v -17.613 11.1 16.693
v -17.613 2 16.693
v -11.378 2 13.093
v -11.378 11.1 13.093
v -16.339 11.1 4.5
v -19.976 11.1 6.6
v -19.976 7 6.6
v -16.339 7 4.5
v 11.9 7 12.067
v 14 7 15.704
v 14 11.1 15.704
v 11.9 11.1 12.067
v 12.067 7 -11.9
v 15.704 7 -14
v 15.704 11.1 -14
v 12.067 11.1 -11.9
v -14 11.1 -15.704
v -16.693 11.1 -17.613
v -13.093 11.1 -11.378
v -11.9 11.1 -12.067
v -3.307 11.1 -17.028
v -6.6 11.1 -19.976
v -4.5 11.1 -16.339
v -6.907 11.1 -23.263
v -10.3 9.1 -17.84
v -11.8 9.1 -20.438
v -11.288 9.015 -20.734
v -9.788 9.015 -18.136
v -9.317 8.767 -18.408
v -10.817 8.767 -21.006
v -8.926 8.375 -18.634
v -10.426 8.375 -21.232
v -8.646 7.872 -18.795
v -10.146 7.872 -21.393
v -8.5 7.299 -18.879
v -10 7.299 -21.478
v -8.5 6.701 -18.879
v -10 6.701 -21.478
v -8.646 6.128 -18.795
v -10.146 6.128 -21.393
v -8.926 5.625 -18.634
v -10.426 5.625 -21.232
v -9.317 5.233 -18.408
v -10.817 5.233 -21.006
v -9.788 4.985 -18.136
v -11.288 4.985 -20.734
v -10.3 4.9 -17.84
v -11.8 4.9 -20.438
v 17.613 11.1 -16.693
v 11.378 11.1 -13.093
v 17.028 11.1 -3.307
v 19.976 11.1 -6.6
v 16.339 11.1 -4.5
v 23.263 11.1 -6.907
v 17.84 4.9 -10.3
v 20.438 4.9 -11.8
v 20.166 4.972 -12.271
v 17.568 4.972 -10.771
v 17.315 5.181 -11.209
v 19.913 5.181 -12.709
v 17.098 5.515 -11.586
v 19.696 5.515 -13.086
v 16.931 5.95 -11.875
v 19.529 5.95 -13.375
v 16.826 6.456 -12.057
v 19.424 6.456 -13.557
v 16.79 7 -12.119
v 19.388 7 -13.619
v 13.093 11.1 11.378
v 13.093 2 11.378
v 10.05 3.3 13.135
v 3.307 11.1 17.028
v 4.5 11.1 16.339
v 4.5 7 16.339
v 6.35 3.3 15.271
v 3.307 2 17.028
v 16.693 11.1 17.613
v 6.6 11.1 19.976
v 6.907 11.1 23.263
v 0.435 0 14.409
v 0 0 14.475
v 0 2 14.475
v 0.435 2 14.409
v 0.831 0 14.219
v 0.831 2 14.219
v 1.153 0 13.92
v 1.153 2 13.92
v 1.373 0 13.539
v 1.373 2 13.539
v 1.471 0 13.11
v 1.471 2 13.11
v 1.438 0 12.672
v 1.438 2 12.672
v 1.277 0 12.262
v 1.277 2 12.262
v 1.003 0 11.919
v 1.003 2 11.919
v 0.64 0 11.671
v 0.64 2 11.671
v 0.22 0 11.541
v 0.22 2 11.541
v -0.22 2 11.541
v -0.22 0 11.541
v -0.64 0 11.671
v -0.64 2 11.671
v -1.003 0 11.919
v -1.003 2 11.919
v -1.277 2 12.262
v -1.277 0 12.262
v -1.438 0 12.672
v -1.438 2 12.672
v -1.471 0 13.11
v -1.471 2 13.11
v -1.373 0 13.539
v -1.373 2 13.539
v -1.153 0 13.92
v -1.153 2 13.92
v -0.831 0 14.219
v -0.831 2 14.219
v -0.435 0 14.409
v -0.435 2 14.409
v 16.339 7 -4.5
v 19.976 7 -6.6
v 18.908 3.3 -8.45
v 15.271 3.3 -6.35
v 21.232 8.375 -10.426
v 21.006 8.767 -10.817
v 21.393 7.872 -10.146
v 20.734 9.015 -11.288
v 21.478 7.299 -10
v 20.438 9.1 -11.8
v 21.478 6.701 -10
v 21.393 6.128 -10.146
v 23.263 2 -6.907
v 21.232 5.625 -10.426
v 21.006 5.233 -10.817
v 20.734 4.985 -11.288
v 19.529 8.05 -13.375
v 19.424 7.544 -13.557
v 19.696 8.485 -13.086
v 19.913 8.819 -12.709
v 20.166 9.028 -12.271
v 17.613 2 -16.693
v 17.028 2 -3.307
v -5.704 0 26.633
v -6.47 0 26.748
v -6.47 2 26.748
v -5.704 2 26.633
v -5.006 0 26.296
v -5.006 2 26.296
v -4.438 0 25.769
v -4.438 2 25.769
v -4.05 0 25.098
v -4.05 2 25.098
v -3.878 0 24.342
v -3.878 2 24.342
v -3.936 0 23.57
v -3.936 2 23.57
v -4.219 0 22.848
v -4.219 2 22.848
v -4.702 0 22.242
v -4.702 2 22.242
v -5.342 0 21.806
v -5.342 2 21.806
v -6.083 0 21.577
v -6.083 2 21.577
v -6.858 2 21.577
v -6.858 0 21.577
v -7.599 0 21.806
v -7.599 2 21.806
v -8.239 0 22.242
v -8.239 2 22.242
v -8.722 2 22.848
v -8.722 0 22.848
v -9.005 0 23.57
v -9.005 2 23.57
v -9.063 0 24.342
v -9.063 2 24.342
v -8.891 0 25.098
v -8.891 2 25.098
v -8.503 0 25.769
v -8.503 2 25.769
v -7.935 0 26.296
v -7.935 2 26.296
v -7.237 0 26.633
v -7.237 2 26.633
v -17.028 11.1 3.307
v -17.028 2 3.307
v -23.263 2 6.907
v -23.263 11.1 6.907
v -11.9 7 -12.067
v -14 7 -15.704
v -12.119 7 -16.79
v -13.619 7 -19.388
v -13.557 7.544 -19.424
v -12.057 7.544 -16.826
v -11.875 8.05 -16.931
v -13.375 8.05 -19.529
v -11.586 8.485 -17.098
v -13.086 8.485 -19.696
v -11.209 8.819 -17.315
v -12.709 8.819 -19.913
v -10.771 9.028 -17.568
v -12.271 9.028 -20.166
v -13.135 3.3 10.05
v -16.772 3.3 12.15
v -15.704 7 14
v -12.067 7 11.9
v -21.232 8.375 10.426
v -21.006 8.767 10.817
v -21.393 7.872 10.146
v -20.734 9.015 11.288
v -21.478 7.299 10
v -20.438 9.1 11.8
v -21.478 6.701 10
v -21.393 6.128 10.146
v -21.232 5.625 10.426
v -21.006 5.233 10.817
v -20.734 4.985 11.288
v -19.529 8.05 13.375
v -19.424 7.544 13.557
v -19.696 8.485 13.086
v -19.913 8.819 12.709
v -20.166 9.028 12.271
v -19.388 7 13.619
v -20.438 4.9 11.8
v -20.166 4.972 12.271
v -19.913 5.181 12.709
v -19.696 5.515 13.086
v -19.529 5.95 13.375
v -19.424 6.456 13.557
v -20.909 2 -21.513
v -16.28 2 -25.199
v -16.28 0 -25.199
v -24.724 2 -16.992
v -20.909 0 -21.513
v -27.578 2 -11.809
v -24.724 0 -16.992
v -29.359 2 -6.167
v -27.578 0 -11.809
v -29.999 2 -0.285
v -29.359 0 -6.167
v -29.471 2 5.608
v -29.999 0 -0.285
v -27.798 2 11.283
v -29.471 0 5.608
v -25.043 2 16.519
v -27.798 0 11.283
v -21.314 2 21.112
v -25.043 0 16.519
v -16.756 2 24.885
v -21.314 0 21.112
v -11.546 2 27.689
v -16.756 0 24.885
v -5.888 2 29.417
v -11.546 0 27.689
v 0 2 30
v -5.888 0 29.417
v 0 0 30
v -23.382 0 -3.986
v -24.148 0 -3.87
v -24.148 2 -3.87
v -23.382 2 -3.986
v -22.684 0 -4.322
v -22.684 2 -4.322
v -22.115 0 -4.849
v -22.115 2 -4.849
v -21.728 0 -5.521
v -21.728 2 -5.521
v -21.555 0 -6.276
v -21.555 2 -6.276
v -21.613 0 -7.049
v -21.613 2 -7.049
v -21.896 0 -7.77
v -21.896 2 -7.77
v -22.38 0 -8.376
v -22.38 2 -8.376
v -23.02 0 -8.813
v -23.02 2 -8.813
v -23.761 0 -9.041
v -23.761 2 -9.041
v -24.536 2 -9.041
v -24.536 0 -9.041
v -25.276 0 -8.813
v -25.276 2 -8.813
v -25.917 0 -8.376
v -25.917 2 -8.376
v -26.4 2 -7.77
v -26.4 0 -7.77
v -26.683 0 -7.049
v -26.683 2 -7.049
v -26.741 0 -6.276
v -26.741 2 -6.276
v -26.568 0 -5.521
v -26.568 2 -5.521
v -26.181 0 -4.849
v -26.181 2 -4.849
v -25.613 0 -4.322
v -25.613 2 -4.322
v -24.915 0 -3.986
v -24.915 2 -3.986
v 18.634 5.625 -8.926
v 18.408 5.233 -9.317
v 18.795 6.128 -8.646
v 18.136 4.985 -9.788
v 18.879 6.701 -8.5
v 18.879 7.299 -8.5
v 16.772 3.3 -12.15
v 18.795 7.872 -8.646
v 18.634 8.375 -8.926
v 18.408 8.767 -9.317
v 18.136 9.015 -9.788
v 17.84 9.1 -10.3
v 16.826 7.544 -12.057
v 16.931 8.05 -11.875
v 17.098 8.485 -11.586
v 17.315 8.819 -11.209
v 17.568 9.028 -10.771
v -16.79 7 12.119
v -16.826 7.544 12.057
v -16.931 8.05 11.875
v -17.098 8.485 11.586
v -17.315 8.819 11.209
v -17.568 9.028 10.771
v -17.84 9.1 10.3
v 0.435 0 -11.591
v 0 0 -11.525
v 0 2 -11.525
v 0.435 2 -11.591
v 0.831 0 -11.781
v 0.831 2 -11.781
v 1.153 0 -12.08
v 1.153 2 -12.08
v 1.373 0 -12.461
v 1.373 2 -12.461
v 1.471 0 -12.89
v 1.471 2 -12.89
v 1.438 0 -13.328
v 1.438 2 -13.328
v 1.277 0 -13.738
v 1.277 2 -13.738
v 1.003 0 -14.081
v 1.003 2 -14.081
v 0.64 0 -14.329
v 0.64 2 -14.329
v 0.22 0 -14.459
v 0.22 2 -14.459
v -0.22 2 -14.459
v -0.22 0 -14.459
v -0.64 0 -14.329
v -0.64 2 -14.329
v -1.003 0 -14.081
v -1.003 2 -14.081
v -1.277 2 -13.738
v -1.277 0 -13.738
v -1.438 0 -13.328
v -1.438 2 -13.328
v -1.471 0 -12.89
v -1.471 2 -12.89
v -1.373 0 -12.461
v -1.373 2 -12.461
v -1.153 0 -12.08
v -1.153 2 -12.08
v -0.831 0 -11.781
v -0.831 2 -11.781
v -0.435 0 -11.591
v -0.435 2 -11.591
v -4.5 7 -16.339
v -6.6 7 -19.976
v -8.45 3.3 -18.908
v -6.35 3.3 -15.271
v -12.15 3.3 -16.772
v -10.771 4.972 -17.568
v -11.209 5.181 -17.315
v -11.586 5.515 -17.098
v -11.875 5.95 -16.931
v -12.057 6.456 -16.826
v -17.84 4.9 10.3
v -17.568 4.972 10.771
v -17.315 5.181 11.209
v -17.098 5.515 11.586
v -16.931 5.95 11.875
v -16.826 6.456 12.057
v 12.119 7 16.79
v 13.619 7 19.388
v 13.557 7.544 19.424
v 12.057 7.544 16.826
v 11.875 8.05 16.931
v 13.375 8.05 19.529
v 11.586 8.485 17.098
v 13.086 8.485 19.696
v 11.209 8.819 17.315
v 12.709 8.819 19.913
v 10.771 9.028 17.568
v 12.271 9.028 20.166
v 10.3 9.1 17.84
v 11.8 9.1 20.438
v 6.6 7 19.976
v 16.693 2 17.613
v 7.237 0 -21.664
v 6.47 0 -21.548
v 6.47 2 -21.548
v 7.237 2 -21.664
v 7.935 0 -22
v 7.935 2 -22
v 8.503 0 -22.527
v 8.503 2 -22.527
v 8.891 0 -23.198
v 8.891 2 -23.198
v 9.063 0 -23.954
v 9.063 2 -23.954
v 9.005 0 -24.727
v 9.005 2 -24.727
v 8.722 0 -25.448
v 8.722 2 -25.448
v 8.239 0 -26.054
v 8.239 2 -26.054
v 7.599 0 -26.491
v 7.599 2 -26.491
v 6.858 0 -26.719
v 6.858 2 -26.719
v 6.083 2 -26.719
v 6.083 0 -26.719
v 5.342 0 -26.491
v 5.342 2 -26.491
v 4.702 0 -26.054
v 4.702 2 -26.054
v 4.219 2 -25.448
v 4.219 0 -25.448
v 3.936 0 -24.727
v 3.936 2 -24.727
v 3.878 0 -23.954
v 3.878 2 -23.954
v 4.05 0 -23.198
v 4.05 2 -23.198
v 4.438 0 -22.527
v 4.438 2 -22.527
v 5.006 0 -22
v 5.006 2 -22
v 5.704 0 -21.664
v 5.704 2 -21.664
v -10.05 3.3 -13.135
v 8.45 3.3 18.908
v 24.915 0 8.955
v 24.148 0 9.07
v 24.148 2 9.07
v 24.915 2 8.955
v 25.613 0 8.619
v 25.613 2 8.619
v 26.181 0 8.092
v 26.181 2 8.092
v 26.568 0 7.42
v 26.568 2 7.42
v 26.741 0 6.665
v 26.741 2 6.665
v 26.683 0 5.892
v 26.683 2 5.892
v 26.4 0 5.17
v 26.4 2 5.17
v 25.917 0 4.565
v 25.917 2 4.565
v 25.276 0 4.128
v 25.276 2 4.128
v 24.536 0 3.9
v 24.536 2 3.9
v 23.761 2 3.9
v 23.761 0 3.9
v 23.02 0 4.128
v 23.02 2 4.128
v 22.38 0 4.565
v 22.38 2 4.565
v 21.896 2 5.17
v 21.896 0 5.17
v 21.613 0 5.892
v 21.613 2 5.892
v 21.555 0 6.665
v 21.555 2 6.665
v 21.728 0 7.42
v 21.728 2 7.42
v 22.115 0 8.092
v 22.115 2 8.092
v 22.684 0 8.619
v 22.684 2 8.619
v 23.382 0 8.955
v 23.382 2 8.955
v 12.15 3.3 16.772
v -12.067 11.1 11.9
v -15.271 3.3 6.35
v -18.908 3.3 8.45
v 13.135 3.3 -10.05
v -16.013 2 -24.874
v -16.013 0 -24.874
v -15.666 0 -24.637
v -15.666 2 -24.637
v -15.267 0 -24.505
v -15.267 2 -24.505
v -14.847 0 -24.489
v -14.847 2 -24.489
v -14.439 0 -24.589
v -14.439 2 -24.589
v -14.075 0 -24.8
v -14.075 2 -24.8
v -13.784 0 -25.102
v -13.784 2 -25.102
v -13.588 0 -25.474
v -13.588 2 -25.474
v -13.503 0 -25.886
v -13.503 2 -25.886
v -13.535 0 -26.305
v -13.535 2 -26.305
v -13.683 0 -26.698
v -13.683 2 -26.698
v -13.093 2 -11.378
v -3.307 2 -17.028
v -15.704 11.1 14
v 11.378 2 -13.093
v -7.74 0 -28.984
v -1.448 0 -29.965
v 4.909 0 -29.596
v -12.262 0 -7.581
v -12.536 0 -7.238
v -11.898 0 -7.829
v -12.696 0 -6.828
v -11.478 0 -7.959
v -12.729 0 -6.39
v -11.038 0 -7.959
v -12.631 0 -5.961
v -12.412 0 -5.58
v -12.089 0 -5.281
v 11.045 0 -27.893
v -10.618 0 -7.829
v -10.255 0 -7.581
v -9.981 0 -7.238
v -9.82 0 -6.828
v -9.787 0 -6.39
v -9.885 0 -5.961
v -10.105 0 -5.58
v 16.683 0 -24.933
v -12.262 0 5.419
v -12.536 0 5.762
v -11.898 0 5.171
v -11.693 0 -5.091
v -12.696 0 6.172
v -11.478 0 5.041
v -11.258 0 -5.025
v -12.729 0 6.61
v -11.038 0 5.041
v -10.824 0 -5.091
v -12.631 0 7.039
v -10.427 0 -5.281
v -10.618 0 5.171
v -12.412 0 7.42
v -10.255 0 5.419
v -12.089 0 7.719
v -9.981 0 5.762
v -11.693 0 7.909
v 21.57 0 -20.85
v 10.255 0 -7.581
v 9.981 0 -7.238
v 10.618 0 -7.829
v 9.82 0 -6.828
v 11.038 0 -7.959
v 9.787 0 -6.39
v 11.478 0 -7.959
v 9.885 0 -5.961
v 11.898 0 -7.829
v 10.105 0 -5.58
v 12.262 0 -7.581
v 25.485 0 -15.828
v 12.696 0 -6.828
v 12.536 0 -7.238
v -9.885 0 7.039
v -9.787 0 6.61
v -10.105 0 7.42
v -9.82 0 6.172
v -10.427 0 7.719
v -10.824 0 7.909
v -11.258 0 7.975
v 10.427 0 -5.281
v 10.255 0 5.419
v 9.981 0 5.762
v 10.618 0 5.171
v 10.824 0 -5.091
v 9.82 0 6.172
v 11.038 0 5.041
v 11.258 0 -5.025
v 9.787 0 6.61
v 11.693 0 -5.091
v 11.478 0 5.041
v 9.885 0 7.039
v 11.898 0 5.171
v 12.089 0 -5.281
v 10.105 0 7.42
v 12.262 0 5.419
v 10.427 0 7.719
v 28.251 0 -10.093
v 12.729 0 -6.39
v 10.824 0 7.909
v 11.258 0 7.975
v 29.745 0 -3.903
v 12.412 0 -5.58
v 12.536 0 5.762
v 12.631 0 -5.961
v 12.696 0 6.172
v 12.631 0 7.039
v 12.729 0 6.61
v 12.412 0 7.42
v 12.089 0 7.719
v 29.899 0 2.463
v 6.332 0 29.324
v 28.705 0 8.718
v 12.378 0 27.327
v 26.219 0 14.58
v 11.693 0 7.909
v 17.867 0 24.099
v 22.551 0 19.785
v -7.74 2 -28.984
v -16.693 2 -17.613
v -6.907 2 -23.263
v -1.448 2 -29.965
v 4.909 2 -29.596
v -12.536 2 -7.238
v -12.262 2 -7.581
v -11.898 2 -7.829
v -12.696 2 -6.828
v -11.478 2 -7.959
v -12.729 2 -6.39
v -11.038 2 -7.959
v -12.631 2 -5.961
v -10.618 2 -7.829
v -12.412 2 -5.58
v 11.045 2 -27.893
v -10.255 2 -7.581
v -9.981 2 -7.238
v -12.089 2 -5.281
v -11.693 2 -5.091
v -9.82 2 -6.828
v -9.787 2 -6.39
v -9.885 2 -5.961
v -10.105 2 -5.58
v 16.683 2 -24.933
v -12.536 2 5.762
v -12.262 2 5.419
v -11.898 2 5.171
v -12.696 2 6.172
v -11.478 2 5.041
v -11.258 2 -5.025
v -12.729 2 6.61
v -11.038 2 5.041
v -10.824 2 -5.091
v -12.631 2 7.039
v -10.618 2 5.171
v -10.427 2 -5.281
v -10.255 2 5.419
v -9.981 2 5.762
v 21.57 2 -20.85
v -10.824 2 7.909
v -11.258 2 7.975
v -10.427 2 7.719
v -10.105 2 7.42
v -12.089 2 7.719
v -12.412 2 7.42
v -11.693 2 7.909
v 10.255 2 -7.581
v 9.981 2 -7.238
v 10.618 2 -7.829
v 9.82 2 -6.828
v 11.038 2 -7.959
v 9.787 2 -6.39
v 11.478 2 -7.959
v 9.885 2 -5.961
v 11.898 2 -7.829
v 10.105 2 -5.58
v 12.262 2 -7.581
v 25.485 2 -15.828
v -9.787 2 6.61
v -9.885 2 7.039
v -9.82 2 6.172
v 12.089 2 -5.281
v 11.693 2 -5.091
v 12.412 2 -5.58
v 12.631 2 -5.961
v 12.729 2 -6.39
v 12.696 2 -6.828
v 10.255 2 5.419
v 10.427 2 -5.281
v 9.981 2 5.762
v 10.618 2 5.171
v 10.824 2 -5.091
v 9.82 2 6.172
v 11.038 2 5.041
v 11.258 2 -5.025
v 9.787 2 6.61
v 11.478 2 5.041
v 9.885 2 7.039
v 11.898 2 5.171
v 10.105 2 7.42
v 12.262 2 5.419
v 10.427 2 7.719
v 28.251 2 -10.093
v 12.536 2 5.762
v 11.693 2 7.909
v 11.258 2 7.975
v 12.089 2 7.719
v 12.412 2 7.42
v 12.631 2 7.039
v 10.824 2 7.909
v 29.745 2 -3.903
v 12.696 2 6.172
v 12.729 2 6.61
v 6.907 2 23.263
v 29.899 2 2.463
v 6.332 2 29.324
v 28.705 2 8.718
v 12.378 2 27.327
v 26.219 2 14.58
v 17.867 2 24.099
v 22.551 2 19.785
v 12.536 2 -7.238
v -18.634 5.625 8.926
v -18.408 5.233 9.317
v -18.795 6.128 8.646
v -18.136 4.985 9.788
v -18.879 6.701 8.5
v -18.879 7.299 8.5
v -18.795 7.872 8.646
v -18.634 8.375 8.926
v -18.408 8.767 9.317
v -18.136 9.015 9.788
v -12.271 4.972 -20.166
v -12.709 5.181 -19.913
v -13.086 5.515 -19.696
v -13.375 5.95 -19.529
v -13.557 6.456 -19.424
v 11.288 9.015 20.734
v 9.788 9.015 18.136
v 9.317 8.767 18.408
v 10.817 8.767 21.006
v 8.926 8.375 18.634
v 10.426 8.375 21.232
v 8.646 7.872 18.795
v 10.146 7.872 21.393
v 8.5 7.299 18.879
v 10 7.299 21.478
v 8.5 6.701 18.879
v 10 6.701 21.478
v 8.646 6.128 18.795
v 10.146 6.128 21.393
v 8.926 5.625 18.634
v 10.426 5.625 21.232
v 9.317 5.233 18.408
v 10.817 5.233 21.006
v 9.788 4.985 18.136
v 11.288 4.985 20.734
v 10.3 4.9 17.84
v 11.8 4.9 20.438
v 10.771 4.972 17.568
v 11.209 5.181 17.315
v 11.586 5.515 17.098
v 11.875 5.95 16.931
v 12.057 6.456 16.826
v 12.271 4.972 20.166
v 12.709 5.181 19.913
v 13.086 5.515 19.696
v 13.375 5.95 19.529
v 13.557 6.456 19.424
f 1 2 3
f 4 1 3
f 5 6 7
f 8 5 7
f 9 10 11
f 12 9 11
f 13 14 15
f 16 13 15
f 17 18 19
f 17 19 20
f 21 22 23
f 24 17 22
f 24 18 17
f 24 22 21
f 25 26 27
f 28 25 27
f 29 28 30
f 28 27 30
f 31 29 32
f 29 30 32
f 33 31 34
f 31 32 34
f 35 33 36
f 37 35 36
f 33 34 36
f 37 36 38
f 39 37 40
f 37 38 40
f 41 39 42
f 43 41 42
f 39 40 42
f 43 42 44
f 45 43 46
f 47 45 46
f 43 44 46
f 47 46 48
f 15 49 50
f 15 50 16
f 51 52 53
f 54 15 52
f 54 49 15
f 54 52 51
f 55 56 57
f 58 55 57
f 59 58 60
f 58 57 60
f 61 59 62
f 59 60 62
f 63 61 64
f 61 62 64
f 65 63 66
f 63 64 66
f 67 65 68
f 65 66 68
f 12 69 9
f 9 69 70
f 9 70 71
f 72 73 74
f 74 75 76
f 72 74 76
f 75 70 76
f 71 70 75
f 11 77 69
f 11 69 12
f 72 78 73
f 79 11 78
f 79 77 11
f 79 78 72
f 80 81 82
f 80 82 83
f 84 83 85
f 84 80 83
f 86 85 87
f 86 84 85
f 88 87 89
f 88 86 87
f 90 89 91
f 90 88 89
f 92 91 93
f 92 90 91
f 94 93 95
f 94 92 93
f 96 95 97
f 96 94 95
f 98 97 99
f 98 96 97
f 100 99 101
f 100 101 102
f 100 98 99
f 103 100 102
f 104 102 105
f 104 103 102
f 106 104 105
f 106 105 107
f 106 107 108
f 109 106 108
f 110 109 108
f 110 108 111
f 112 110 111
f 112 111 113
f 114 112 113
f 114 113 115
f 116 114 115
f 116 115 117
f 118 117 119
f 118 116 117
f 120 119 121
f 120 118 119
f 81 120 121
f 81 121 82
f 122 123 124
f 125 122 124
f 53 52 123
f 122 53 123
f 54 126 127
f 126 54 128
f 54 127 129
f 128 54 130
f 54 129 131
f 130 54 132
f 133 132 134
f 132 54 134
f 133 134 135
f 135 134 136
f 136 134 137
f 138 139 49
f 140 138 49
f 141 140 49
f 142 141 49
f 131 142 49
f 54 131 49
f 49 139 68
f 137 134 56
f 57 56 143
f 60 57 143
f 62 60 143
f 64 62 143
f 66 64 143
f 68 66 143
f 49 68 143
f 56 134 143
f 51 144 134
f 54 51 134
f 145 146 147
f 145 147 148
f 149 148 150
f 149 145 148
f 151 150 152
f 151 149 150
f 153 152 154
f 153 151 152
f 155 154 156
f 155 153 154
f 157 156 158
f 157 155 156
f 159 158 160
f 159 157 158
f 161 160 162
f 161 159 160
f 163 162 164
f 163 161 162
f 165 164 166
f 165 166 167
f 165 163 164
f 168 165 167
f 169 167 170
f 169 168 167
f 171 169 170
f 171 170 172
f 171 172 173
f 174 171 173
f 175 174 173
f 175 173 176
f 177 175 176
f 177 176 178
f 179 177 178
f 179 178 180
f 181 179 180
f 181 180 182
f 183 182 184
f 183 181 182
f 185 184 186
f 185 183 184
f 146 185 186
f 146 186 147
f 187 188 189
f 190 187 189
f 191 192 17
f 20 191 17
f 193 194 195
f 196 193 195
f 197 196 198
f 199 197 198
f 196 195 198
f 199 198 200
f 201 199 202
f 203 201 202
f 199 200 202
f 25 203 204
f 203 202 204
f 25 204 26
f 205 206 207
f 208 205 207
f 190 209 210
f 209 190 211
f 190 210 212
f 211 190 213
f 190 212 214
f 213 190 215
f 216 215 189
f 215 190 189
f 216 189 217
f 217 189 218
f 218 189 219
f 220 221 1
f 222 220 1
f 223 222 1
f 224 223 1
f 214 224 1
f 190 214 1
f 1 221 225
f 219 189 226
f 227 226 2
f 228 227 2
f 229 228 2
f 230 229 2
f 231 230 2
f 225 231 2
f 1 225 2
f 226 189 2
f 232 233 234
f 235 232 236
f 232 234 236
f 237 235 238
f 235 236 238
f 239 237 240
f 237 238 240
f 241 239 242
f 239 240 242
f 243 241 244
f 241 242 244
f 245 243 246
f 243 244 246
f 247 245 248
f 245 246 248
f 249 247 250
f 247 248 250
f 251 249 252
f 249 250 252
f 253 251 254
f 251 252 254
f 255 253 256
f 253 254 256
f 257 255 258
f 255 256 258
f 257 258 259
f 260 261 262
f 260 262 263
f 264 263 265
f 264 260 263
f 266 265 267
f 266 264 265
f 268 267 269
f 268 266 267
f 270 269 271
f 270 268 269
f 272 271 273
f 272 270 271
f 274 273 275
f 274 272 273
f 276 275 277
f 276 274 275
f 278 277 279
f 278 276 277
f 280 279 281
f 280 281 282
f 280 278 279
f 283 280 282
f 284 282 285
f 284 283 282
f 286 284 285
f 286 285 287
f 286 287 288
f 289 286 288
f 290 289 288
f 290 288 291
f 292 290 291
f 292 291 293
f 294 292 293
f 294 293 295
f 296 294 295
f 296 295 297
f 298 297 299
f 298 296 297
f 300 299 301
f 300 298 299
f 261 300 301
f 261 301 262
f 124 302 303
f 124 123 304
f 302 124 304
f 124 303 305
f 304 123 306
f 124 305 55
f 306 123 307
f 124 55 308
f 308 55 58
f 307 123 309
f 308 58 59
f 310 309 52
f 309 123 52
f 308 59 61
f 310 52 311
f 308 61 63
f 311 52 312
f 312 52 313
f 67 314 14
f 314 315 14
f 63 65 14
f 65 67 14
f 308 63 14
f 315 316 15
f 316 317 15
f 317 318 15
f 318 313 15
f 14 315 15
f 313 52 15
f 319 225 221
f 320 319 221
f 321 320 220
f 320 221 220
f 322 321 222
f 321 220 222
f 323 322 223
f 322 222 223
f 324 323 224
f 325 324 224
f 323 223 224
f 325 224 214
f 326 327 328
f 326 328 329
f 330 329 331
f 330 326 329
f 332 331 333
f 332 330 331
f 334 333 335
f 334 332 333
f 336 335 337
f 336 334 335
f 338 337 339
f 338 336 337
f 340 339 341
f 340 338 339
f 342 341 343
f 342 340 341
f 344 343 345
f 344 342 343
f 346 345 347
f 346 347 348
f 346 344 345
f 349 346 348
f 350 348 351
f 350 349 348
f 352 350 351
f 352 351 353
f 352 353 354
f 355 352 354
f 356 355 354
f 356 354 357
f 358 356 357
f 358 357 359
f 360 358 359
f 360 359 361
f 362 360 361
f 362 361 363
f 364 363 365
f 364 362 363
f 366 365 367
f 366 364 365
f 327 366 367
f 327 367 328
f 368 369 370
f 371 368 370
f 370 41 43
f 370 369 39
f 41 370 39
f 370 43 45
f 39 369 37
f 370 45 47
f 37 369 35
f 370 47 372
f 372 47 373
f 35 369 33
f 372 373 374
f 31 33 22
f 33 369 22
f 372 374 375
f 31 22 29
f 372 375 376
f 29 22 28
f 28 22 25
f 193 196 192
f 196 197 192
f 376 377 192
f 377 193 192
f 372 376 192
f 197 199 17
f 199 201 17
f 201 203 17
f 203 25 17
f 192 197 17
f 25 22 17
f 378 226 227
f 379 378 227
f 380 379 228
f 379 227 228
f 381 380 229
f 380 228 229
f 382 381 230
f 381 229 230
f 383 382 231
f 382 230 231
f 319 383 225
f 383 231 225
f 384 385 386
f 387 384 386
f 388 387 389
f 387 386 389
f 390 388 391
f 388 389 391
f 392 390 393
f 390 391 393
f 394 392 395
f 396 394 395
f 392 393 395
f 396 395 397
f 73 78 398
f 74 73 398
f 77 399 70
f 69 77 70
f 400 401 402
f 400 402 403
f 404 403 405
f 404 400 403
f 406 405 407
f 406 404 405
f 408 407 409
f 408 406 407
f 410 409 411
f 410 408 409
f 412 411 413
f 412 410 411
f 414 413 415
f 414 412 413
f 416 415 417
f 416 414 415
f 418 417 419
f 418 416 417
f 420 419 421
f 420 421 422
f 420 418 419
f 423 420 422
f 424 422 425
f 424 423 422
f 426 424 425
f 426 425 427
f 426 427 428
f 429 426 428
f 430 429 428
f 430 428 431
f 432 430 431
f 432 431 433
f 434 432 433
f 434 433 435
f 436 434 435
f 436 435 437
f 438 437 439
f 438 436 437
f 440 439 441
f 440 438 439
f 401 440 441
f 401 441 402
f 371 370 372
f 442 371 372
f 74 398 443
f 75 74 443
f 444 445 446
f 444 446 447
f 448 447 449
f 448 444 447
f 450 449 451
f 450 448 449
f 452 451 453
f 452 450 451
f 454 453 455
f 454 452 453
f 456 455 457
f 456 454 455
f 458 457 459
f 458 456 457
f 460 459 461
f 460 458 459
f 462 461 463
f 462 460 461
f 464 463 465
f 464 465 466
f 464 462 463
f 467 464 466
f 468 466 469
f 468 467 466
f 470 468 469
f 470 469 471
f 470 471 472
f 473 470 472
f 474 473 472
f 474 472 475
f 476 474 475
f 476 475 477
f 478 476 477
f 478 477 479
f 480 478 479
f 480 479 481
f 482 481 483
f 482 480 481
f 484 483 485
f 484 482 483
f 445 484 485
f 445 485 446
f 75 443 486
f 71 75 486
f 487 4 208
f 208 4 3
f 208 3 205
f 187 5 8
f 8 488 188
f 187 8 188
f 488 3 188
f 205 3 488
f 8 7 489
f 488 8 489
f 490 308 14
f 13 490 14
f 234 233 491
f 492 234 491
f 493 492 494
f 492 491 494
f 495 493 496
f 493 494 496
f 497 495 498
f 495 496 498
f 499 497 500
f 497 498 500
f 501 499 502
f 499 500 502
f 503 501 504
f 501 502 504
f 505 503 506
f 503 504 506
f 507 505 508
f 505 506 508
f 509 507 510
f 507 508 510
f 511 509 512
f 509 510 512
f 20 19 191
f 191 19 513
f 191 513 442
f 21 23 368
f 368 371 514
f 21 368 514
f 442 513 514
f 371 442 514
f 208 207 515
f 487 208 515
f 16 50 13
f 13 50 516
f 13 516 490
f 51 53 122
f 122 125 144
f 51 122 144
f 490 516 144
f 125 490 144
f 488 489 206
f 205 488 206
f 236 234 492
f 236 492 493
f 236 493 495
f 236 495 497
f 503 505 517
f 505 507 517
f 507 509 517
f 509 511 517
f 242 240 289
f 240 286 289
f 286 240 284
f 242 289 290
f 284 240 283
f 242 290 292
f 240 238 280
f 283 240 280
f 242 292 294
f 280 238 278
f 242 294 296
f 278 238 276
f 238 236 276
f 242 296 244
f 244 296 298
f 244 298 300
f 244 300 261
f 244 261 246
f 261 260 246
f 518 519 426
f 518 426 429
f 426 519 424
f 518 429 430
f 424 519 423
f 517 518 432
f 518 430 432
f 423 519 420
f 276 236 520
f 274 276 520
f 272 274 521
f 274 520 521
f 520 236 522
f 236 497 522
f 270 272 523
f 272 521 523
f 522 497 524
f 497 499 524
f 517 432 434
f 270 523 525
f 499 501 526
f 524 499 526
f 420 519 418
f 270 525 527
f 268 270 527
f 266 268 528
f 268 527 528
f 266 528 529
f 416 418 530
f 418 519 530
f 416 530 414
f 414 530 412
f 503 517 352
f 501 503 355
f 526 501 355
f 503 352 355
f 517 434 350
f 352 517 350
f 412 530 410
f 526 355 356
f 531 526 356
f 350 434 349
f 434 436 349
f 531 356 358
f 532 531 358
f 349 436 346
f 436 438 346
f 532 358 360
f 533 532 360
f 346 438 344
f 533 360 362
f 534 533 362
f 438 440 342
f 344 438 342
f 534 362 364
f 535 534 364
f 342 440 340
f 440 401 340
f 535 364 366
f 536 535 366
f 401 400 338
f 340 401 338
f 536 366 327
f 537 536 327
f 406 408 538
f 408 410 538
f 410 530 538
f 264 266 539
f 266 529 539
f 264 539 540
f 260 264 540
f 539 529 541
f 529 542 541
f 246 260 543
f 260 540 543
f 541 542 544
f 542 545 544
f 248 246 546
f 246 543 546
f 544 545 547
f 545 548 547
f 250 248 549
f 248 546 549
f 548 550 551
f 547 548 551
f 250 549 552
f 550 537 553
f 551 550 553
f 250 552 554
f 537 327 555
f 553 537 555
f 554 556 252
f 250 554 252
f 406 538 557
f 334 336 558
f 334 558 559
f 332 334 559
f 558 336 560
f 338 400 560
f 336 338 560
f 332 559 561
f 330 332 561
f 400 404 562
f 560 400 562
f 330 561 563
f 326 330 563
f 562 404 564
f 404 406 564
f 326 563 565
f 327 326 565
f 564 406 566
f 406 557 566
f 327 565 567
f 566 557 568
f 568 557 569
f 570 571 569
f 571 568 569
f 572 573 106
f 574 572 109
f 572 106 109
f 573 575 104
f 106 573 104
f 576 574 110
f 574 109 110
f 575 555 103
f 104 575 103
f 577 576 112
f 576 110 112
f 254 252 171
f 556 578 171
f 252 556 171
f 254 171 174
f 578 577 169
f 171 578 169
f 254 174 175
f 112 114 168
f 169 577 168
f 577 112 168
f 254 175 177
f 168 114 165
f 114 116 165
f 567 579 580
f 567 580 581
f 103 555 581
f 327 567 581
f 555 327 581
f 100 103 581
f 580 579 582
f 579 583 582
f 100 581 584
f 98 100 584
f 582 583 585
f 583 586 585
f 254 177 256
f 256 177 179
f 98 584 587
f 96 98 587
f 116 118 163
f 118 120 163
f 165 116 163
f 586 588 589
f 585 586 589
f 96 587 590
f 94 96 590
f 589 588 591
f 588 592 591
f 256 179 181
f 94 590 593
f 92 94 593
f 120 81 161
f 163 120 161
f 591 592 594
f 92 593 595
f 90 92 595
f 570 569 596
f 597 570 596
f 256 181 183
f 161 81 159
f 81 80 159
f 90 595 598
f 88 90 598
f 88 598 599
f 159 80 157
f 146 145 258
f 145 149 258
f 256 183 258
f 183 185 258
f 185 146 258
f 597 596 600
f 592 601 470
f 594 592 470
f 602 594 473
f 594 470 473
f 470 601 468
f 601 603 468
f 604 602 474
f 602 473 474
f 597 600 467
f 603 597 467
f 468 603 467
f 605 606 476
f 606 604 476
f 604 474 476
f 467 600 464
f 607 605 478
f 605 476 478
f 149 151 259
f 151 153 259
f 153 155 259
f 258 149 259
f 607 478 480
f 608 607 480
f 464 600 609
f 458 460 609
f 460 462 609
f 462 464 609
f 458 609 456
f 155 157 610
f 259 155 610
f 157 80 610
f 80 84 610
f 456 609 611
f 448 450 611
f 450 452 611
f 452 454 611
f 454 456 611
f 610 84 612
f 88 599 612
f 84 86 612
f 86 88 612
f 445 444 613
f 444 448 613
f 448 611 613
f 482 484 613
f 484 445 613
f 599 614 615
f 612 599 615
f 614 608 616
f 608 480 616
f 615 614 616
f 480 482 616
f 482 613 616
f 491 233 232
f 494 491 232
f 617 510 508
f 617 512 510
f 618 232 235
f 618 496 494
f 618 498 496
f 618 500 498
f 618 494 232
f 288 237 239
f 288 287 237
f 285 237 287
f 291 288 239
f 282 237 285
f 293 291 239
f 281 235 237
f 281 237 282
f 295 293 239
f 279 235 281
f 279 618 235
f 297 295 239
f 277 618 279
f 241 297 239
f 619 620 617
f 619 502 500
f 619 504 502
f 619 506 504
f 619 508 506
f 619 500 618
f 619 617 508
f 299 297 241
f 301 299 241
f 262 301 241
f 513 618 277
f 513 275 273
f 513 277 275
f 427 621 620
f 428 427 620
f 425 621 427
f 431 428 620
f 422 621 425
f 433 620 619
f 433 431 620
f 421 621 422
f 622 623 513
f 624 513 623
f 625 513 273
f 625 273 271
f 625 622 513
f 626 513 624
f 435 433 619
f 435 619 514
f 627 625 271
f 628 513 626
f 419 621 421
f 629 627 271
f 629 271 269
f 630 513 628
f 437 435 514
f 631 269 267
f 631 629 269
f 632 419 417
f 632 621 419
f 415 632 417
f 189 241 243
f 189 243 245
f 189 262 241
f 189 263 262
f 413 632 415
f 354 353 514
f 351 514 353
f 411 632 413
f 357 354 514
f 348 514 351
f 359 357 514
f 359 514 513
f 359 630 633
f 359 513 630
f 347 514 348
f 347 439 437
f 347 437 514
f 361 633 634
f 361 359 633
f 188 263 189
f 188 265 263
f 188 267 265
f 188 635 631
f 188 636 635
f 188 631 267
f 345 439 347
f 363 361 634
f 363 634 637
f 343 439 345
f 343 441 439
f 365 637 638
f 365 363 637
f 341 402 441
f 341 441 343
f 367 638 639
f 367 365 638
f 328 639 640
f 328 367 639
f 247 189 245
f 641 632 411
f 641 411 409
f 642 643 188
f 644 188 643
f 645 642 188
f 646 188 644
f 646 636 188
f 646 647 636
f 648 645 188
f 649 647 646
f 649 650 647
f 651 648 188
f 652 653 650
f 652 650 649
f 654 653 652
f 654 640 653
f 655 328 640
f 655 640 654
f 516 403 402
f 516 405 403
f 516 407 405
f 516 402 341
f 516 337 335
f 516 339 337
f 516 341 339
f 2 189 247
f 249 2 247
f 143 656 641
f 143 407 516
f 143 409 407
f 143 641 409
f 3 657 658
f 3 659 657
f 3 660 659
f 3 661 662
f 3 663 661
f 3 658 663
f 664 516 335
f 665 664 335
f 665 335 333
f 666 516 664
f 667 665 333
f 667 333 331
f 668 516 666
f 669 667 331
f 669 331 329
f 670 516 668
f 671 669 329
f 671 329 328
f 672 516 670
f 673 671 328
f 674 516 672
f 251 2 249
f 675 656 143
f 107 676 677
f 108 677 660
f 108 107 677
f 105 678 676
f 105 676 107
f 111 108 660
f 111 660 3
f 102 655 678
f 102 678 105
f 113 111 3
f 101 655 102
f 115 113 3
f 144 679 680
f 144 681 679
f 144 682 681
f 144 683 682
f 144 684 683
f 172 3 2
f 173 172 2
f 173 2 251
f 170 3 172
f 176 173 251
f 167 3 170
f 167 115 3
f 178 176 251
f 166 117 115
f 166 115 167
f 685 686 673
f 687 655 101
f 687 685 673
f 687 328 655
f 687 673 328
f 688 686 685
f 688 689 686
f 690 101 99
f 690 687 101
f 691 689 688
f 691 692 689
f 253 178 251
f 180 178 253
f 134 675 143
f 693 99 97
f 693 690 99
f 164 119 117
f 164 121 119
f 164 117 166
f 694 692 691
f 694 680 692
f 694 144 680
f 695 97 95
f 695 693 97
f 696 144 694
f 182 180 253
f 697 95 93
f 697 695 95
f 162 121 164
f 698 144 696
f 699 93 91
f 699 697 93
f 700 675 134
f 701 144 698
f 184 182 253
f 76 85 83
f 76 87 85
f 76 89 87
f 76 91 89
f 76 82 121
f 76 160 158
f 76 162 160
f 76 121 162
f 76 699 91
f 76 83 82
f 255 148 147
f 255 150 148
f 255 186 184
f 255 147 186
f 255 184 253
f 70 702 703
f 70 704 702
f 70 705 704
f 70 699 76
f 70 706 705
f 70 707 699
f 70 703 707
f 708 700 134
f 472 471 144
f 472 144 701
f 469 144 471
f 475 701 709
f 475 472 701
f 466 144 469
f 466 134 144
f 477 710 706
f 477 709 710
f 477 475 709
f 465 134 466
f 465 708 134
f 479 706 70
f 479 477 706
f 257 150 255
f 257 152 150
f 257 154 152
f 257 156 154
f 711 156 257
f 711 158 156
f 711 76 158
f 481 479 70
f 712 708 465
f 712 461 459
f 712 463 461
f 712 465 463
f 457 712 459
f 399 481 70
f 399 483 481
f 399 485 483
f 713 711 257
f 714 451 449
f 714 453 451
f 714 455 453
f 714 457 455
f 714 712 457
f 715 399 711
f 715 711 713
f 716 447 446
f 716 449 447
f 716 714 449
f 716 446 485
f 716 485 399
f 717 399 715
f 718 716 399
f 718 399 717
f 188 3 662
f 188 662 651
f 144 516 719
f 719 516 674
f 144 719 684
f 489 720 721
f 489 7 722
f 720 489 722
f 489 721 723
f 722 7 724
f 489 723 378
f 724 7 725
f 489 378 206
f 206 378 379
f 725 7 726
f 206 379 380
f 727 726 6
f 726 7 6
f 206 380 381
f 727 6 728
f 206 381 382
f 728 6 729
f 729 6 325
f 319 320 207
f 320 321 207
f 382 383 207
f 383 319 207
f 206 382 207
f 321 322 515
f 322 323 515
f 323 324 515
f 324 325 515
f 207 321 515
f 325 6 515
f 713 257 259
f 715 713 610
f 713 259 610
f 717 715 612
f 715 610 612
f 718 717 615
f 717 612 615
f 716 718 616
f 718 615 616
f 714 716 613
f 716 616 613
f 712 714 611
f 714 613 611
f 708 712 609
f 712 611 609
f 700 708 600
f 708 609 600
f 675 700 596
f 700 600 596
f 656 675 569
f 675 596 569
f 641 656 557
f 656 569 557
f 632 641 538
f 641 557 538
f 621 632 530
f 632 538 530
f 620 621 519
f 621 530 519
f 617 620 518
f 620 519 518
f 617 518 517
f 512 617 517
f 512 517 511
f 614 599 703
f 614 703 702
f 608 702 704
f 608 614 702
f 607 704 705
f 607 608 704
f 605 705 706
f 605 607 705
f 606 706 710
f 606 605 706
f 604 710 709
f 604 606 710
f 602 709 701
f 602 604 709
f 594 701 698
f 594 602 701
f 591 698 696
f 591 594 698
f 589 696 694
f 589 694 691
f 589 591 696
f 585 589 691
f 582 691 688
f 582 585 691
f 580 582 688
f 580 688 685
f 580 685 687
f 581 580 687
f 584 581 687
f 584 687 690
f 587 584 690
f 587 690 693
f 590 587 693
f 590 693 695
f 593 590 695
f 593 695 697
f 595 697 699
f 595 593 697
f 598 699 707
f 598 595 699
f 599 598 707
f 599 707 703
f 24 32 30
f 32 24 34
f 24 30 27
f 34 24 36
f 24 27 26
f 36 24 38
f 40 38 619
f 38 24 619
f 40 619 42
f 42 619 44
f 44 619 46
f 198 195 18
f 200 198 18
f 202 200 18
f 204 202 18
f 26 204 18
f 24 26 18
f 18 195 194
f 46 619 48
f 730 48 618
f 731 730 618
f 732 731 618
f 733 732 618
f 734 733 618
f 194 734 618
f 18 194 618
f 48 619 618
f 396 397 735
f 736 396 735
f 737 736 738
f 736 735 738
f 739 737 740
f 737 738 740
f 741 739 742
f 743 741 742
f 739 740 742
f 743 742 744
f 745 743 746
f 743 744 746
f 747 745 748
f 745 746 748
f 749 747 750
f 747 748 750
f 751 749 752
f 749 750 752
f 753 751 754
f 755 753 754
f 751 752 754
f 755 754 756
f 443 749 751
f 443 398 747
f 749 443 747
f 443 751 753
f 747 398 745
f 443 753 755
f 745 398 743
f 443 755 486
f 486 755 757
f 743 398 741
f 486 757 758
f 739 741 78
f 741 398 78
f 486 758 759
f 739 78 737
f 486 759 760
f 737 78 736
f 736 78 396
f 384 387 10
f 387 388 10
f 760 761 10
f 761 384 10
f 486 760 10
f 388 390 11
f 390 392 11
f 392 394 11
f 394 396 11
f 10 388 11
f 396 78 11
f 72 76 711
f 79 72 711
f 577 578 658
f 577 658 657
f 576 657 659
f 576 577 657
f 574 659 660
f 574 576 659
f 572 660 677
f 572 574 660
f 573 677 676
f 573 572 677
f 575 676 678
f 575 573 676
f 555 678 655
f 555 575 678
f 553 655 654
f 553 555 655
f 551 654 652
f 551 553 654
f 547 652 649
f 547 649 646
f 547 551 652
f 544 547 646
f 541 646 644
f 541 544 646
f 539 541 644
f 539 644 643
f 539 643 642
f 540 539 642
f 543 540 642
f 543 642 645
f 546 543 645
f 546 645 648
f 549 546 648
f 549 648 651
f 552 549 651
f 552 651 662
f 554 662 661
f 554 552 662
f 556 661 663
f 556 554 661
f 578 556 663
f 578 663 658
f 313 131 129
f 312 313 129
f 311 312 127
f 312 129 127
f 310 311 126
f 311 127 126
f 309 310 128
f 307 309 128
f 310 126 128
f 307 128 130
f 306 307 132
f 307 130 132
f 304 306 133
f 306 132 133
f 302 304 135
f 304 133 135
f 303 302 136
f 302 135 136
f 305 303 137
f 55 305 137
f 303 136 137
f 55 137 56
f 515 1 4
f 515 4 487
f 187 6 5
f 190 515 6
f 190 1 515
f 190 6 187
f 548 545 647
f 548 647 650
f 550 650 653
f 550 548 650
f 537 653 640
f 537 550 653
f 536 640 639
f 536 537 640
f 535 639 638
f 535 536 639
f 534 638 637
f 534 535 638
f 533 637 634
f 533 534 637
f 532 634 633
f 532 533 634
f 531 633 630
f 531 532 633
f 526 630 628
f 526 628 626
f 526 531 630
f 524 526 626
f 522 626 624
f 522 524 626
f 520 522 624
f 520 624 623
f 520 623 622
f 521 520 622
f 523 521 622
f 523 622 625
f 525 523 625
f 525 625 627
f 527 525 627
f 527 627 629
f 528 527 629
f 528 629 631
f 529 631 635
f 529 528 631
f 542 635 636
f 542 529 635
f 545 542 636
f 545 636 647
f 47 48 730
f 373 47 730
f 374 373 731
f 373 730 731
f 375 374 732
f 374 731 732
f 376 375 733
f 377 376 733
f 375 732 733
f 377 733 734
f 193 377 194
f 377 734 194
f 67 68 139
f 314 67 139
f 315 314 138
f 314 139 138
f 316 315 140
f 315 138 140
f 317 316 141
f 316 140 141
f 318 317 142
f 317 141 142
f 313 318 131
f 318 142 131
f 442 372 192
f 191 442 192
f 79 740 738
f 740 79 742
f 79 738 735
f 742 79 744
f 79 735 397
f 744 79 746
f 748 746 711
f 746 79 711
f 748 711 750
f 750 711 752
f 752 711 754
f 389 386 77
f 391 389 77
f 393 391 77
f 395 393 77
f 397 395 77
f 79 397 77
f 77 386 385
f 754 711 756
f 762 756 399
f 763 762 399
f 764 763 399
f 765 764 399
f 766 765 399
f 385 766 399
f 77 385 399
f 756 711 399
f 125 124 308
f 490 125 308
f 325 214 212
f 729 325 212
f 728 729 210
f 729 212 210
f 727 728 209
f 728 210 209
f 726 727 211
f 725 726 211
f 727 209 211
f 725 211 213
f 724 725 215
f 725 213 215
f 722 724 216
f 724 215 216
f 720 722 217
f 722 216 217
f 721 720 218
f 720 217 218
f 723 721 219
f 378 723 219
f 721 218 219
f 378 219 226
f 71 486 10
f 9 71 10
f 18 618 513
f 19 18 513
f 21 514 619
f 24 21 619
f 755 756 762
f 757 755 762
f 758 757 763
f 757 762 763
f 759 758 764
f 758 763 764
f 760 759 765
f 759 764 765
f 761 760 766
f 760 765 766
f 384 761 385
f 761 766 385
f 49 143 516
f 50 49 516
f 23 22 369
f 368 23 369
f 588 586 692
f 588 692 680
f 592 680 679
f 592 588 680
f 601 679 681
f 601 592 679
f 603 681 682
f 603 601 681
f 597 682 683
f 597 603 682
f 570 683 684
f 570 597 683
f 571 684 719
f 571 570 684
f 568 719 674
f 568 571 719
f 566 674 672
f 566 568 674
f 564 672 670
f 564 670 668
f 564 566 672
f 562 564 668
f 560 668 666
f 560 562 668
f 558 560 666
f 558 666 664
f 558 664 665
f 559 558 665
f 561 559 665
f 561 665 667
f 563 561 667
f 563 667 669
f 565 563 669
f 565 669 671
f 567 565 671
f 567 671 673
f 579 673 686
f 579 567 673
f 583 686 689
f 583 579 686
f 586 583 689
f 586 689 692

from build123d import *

# Parameters (mm, degrees)
SKETCH1_R           = 30
SKETCH1_R_2         = 1.475
SKETCH1_R_3         = 2.6
BOSS_EXTRUDE1_DEPTH = 2
SKETCH2_R           = 1.5
CUT_EXTRUDE1_DEPTH  = 10
BOSS_EXTRUDE3_DEPTH = 9.1
CIRPATTERN1_COUNT   = 4
CUT_EXTRUDE2_START  = -3
CUT_EXTRUDE2_DEPTH  = 5
CUT_EXTRUDE3_DEPTH  = 15
CIRPATTERN2_COUNT   = 4
CIRPATTERN3_COUNT   = 4


with BuildPart() as part:
    # Sketch1 → Boss-Extrude1 (new body)
    with BuildSketch(Plane(origin=(0, 0, 0), x_dir=(1, 0, 0), z_dir=(0, 1, 0))):
        with Locations(Location((0, 0, 0), (0, 0, 270))):
            Circle(SKETCH1_R)
        with Locations(Location((0, 13, 0), (0, 0, 270))):
            Circle(SKETCH1_R_2, mode=Mode.SUBTRACT)
        with Locations(Location((11.258330249, 6.5, 0), (0, 0, 270))):
            Circle(SKETCH1_R_2, mode=Mode.SUBTRACT)
        with Locations(Location((11.258330249, -6.5, 0), (0, 0, 270))):
            Circle(SKETCH1_R_2, mode=Mode.SUBTRACT)
        with Locations(Location((0, -13, 0), (0, 0, 270))):
            Circle(SKETCH1_R_2, mode=Mode.SUBTRACT)
        with Locations(Location((-11.258330249, -6.5, 0), (0, 0, 270))):
            Circle(SKETCH1_R_2, mode=Mode.SUBTRACT)
        with Locations(Location((-11.258330249, 6.5, 0), (0, 0, 270))):
            Circle(SKETCH1_R_2, mode=Mode.SUBTRACT)
        with Locations(Location((-24.148145657, 6.470476128, 0), (0, 0, 270))):
            Circle(SKETCH1_R_3, mode=Mode.SUBTRACT)
        with Locations(Location((6.470476128, 24.148145657, 0), (0, 0, 270))):
            Circle(SKETCH1_R_3, mode=Mode.SUBTRACT)
        with Locations(Location((24.148145657, -6.470476128, 0), (0, 0, 270))):
            Circle(SKETCH1_R_3, mode=Mode.SUBTRACT)
        with Locations(Location((-6.470476128, -24.148145657, 0), (0, 0, 270))):
            Circle(SKETCH1_R_3, mode=Mode.SUBTRACT)
    extrude(amount=BOSS_EXTRUDE1_DEPTH)

    # Sketch2 → Cut-Extrude1 (cut)
    with BuildSketch(Plane(origin=(0, 2, 0), x_dir=(1, 0, 0), z_dir=(0, 1, 0))):
        with Locations((-15, 25.980762114)):
            Circle(SKETCH2_R)
    extrude(amount=-CUT_EXTRUDE1_DEPTH, mode=Mode.SUBTRACT)

    # Sketch8 → Boss-Extrude3 (add)
    with BuildSketch(Plane(origin=(0, 2, 0), x_dir=(1, 0, 0), z_dir=(0, 1, 0))):
        Polygon((-6.906956469, 23.263199529), (-11.8, 20.438199529), (-8.2, 14.202816622), (-3.306956469, 17.027816622), align=None)
        Polygon((-8.2, 14.202816622), (-11.8, 20.438199529), (-16.693043531, 17.613199529), (-13.093043531, 11.377816622), align=None)
    boss_extrude3 = extrude(amount=BOSS_EXTRUDE3_DEPTH)

    # CirPattern1: Boss-Extrude3 ×4 about axis
    cirpattern1_axis = Axis((0, 0, 0), (0, 1, 0))
    for i in range(1, CIRPATTERN1_COUNT):
        add(boss_extrude3.rotate(cirpattern1_axis, i * 360 / CIRPATTERN1_COUNT))

    # Sketch9 → Cut-Extrude2 (cut)
    with BuildSketch(Plane(origin=(-11.8, 0, -20.438199529), x_dir=(-0.8660254037844384, 0, 0.5000000000000006), z_dir=(-0.5000000000000006, 0, -0.8660254037844384)).offset(CUT_EXTRUDE2_START)):
        Polygon((0, 3.3), (0, 10.7), (-2.136195996, 10.7), (-4.272391992, 7), (-2.136195996, 3.3), align=None)
        Polygon((2.136195996, 10.7), (0, 10.7), (0, 3.3), (2.136195996, 3.3), (4.272391992, 7), align=None)
        Polygon((0, 10.7), (0, 11.1), (-4.272391992, 11.1), (-4.272391992, 7), (-2.136195996, 10.7), align=None)
        Polygon((4.272391992, 11.1), (0, 11.1), (0, 10.7), (2.136195996, 10.7), (4.272391992, 7), align=None)
    cut_extrude2 = extrude(amount=-CUT_EXTRUDE2_DEPTH, mode=Mode.SUBTRACT)

    # Sketch10 → Cut-Extrude3 (cut)
    with BuildSketch(Plane(origin=(-11.8, 0, -20.438199529), x_dir=(-0.8660254037844384, 0, 0.5000000000000006), z_dir=(-0.5000000000000006, 0, -0.8660254037844384))):
        with BuildLine():
            ThreePointArc((2.1, 7), (1.48492424, 8.48492424), (0, 9.1))
            Line((0, 9.1), (0, 4.9))
            ThreePointArc((0, 4.9), (1.48492424, 5.51507576), (2.1, 7))
        make_face()
        with BuildLine():
            Line((0, 4.9), (0, 9.1))
            ThreePointArc((0, 9.1), (-2.1, 7), (0, 4.9))
        make_face()
    cut_extrude3 = extrude(amount=-CUT_EXTRUDE3_DEPTH, mode=Mode.SUBTRACT)

    # CirPattern2: Cut-Extrude2 ×4 about axis
    cirpattern2_axis = Axis((0, 0, 0), (0, 1, 0))
    for i in range(1, CIRPATTERN2_COUNT):
        add(cut_extrude2.rotate(cirpattern2_axis, i * 360 / CIRPATTERN2_COUNT), mode=Mode.SUBTRACT)

    # CirPattern3: Cut-Extrude3 ×4 about axis
    cirpattern3_axis = Axis((0, 2, 0), (0, 1, 0))
    for i in range(1, CIRPATTERN3_COUNT):
        add(cut_extrude3.rotate(cirpattern3_axis, i * 360 / CIRPATTERN3_COUNT), mode=Mode.SUBTRACT)


solid = part.part
